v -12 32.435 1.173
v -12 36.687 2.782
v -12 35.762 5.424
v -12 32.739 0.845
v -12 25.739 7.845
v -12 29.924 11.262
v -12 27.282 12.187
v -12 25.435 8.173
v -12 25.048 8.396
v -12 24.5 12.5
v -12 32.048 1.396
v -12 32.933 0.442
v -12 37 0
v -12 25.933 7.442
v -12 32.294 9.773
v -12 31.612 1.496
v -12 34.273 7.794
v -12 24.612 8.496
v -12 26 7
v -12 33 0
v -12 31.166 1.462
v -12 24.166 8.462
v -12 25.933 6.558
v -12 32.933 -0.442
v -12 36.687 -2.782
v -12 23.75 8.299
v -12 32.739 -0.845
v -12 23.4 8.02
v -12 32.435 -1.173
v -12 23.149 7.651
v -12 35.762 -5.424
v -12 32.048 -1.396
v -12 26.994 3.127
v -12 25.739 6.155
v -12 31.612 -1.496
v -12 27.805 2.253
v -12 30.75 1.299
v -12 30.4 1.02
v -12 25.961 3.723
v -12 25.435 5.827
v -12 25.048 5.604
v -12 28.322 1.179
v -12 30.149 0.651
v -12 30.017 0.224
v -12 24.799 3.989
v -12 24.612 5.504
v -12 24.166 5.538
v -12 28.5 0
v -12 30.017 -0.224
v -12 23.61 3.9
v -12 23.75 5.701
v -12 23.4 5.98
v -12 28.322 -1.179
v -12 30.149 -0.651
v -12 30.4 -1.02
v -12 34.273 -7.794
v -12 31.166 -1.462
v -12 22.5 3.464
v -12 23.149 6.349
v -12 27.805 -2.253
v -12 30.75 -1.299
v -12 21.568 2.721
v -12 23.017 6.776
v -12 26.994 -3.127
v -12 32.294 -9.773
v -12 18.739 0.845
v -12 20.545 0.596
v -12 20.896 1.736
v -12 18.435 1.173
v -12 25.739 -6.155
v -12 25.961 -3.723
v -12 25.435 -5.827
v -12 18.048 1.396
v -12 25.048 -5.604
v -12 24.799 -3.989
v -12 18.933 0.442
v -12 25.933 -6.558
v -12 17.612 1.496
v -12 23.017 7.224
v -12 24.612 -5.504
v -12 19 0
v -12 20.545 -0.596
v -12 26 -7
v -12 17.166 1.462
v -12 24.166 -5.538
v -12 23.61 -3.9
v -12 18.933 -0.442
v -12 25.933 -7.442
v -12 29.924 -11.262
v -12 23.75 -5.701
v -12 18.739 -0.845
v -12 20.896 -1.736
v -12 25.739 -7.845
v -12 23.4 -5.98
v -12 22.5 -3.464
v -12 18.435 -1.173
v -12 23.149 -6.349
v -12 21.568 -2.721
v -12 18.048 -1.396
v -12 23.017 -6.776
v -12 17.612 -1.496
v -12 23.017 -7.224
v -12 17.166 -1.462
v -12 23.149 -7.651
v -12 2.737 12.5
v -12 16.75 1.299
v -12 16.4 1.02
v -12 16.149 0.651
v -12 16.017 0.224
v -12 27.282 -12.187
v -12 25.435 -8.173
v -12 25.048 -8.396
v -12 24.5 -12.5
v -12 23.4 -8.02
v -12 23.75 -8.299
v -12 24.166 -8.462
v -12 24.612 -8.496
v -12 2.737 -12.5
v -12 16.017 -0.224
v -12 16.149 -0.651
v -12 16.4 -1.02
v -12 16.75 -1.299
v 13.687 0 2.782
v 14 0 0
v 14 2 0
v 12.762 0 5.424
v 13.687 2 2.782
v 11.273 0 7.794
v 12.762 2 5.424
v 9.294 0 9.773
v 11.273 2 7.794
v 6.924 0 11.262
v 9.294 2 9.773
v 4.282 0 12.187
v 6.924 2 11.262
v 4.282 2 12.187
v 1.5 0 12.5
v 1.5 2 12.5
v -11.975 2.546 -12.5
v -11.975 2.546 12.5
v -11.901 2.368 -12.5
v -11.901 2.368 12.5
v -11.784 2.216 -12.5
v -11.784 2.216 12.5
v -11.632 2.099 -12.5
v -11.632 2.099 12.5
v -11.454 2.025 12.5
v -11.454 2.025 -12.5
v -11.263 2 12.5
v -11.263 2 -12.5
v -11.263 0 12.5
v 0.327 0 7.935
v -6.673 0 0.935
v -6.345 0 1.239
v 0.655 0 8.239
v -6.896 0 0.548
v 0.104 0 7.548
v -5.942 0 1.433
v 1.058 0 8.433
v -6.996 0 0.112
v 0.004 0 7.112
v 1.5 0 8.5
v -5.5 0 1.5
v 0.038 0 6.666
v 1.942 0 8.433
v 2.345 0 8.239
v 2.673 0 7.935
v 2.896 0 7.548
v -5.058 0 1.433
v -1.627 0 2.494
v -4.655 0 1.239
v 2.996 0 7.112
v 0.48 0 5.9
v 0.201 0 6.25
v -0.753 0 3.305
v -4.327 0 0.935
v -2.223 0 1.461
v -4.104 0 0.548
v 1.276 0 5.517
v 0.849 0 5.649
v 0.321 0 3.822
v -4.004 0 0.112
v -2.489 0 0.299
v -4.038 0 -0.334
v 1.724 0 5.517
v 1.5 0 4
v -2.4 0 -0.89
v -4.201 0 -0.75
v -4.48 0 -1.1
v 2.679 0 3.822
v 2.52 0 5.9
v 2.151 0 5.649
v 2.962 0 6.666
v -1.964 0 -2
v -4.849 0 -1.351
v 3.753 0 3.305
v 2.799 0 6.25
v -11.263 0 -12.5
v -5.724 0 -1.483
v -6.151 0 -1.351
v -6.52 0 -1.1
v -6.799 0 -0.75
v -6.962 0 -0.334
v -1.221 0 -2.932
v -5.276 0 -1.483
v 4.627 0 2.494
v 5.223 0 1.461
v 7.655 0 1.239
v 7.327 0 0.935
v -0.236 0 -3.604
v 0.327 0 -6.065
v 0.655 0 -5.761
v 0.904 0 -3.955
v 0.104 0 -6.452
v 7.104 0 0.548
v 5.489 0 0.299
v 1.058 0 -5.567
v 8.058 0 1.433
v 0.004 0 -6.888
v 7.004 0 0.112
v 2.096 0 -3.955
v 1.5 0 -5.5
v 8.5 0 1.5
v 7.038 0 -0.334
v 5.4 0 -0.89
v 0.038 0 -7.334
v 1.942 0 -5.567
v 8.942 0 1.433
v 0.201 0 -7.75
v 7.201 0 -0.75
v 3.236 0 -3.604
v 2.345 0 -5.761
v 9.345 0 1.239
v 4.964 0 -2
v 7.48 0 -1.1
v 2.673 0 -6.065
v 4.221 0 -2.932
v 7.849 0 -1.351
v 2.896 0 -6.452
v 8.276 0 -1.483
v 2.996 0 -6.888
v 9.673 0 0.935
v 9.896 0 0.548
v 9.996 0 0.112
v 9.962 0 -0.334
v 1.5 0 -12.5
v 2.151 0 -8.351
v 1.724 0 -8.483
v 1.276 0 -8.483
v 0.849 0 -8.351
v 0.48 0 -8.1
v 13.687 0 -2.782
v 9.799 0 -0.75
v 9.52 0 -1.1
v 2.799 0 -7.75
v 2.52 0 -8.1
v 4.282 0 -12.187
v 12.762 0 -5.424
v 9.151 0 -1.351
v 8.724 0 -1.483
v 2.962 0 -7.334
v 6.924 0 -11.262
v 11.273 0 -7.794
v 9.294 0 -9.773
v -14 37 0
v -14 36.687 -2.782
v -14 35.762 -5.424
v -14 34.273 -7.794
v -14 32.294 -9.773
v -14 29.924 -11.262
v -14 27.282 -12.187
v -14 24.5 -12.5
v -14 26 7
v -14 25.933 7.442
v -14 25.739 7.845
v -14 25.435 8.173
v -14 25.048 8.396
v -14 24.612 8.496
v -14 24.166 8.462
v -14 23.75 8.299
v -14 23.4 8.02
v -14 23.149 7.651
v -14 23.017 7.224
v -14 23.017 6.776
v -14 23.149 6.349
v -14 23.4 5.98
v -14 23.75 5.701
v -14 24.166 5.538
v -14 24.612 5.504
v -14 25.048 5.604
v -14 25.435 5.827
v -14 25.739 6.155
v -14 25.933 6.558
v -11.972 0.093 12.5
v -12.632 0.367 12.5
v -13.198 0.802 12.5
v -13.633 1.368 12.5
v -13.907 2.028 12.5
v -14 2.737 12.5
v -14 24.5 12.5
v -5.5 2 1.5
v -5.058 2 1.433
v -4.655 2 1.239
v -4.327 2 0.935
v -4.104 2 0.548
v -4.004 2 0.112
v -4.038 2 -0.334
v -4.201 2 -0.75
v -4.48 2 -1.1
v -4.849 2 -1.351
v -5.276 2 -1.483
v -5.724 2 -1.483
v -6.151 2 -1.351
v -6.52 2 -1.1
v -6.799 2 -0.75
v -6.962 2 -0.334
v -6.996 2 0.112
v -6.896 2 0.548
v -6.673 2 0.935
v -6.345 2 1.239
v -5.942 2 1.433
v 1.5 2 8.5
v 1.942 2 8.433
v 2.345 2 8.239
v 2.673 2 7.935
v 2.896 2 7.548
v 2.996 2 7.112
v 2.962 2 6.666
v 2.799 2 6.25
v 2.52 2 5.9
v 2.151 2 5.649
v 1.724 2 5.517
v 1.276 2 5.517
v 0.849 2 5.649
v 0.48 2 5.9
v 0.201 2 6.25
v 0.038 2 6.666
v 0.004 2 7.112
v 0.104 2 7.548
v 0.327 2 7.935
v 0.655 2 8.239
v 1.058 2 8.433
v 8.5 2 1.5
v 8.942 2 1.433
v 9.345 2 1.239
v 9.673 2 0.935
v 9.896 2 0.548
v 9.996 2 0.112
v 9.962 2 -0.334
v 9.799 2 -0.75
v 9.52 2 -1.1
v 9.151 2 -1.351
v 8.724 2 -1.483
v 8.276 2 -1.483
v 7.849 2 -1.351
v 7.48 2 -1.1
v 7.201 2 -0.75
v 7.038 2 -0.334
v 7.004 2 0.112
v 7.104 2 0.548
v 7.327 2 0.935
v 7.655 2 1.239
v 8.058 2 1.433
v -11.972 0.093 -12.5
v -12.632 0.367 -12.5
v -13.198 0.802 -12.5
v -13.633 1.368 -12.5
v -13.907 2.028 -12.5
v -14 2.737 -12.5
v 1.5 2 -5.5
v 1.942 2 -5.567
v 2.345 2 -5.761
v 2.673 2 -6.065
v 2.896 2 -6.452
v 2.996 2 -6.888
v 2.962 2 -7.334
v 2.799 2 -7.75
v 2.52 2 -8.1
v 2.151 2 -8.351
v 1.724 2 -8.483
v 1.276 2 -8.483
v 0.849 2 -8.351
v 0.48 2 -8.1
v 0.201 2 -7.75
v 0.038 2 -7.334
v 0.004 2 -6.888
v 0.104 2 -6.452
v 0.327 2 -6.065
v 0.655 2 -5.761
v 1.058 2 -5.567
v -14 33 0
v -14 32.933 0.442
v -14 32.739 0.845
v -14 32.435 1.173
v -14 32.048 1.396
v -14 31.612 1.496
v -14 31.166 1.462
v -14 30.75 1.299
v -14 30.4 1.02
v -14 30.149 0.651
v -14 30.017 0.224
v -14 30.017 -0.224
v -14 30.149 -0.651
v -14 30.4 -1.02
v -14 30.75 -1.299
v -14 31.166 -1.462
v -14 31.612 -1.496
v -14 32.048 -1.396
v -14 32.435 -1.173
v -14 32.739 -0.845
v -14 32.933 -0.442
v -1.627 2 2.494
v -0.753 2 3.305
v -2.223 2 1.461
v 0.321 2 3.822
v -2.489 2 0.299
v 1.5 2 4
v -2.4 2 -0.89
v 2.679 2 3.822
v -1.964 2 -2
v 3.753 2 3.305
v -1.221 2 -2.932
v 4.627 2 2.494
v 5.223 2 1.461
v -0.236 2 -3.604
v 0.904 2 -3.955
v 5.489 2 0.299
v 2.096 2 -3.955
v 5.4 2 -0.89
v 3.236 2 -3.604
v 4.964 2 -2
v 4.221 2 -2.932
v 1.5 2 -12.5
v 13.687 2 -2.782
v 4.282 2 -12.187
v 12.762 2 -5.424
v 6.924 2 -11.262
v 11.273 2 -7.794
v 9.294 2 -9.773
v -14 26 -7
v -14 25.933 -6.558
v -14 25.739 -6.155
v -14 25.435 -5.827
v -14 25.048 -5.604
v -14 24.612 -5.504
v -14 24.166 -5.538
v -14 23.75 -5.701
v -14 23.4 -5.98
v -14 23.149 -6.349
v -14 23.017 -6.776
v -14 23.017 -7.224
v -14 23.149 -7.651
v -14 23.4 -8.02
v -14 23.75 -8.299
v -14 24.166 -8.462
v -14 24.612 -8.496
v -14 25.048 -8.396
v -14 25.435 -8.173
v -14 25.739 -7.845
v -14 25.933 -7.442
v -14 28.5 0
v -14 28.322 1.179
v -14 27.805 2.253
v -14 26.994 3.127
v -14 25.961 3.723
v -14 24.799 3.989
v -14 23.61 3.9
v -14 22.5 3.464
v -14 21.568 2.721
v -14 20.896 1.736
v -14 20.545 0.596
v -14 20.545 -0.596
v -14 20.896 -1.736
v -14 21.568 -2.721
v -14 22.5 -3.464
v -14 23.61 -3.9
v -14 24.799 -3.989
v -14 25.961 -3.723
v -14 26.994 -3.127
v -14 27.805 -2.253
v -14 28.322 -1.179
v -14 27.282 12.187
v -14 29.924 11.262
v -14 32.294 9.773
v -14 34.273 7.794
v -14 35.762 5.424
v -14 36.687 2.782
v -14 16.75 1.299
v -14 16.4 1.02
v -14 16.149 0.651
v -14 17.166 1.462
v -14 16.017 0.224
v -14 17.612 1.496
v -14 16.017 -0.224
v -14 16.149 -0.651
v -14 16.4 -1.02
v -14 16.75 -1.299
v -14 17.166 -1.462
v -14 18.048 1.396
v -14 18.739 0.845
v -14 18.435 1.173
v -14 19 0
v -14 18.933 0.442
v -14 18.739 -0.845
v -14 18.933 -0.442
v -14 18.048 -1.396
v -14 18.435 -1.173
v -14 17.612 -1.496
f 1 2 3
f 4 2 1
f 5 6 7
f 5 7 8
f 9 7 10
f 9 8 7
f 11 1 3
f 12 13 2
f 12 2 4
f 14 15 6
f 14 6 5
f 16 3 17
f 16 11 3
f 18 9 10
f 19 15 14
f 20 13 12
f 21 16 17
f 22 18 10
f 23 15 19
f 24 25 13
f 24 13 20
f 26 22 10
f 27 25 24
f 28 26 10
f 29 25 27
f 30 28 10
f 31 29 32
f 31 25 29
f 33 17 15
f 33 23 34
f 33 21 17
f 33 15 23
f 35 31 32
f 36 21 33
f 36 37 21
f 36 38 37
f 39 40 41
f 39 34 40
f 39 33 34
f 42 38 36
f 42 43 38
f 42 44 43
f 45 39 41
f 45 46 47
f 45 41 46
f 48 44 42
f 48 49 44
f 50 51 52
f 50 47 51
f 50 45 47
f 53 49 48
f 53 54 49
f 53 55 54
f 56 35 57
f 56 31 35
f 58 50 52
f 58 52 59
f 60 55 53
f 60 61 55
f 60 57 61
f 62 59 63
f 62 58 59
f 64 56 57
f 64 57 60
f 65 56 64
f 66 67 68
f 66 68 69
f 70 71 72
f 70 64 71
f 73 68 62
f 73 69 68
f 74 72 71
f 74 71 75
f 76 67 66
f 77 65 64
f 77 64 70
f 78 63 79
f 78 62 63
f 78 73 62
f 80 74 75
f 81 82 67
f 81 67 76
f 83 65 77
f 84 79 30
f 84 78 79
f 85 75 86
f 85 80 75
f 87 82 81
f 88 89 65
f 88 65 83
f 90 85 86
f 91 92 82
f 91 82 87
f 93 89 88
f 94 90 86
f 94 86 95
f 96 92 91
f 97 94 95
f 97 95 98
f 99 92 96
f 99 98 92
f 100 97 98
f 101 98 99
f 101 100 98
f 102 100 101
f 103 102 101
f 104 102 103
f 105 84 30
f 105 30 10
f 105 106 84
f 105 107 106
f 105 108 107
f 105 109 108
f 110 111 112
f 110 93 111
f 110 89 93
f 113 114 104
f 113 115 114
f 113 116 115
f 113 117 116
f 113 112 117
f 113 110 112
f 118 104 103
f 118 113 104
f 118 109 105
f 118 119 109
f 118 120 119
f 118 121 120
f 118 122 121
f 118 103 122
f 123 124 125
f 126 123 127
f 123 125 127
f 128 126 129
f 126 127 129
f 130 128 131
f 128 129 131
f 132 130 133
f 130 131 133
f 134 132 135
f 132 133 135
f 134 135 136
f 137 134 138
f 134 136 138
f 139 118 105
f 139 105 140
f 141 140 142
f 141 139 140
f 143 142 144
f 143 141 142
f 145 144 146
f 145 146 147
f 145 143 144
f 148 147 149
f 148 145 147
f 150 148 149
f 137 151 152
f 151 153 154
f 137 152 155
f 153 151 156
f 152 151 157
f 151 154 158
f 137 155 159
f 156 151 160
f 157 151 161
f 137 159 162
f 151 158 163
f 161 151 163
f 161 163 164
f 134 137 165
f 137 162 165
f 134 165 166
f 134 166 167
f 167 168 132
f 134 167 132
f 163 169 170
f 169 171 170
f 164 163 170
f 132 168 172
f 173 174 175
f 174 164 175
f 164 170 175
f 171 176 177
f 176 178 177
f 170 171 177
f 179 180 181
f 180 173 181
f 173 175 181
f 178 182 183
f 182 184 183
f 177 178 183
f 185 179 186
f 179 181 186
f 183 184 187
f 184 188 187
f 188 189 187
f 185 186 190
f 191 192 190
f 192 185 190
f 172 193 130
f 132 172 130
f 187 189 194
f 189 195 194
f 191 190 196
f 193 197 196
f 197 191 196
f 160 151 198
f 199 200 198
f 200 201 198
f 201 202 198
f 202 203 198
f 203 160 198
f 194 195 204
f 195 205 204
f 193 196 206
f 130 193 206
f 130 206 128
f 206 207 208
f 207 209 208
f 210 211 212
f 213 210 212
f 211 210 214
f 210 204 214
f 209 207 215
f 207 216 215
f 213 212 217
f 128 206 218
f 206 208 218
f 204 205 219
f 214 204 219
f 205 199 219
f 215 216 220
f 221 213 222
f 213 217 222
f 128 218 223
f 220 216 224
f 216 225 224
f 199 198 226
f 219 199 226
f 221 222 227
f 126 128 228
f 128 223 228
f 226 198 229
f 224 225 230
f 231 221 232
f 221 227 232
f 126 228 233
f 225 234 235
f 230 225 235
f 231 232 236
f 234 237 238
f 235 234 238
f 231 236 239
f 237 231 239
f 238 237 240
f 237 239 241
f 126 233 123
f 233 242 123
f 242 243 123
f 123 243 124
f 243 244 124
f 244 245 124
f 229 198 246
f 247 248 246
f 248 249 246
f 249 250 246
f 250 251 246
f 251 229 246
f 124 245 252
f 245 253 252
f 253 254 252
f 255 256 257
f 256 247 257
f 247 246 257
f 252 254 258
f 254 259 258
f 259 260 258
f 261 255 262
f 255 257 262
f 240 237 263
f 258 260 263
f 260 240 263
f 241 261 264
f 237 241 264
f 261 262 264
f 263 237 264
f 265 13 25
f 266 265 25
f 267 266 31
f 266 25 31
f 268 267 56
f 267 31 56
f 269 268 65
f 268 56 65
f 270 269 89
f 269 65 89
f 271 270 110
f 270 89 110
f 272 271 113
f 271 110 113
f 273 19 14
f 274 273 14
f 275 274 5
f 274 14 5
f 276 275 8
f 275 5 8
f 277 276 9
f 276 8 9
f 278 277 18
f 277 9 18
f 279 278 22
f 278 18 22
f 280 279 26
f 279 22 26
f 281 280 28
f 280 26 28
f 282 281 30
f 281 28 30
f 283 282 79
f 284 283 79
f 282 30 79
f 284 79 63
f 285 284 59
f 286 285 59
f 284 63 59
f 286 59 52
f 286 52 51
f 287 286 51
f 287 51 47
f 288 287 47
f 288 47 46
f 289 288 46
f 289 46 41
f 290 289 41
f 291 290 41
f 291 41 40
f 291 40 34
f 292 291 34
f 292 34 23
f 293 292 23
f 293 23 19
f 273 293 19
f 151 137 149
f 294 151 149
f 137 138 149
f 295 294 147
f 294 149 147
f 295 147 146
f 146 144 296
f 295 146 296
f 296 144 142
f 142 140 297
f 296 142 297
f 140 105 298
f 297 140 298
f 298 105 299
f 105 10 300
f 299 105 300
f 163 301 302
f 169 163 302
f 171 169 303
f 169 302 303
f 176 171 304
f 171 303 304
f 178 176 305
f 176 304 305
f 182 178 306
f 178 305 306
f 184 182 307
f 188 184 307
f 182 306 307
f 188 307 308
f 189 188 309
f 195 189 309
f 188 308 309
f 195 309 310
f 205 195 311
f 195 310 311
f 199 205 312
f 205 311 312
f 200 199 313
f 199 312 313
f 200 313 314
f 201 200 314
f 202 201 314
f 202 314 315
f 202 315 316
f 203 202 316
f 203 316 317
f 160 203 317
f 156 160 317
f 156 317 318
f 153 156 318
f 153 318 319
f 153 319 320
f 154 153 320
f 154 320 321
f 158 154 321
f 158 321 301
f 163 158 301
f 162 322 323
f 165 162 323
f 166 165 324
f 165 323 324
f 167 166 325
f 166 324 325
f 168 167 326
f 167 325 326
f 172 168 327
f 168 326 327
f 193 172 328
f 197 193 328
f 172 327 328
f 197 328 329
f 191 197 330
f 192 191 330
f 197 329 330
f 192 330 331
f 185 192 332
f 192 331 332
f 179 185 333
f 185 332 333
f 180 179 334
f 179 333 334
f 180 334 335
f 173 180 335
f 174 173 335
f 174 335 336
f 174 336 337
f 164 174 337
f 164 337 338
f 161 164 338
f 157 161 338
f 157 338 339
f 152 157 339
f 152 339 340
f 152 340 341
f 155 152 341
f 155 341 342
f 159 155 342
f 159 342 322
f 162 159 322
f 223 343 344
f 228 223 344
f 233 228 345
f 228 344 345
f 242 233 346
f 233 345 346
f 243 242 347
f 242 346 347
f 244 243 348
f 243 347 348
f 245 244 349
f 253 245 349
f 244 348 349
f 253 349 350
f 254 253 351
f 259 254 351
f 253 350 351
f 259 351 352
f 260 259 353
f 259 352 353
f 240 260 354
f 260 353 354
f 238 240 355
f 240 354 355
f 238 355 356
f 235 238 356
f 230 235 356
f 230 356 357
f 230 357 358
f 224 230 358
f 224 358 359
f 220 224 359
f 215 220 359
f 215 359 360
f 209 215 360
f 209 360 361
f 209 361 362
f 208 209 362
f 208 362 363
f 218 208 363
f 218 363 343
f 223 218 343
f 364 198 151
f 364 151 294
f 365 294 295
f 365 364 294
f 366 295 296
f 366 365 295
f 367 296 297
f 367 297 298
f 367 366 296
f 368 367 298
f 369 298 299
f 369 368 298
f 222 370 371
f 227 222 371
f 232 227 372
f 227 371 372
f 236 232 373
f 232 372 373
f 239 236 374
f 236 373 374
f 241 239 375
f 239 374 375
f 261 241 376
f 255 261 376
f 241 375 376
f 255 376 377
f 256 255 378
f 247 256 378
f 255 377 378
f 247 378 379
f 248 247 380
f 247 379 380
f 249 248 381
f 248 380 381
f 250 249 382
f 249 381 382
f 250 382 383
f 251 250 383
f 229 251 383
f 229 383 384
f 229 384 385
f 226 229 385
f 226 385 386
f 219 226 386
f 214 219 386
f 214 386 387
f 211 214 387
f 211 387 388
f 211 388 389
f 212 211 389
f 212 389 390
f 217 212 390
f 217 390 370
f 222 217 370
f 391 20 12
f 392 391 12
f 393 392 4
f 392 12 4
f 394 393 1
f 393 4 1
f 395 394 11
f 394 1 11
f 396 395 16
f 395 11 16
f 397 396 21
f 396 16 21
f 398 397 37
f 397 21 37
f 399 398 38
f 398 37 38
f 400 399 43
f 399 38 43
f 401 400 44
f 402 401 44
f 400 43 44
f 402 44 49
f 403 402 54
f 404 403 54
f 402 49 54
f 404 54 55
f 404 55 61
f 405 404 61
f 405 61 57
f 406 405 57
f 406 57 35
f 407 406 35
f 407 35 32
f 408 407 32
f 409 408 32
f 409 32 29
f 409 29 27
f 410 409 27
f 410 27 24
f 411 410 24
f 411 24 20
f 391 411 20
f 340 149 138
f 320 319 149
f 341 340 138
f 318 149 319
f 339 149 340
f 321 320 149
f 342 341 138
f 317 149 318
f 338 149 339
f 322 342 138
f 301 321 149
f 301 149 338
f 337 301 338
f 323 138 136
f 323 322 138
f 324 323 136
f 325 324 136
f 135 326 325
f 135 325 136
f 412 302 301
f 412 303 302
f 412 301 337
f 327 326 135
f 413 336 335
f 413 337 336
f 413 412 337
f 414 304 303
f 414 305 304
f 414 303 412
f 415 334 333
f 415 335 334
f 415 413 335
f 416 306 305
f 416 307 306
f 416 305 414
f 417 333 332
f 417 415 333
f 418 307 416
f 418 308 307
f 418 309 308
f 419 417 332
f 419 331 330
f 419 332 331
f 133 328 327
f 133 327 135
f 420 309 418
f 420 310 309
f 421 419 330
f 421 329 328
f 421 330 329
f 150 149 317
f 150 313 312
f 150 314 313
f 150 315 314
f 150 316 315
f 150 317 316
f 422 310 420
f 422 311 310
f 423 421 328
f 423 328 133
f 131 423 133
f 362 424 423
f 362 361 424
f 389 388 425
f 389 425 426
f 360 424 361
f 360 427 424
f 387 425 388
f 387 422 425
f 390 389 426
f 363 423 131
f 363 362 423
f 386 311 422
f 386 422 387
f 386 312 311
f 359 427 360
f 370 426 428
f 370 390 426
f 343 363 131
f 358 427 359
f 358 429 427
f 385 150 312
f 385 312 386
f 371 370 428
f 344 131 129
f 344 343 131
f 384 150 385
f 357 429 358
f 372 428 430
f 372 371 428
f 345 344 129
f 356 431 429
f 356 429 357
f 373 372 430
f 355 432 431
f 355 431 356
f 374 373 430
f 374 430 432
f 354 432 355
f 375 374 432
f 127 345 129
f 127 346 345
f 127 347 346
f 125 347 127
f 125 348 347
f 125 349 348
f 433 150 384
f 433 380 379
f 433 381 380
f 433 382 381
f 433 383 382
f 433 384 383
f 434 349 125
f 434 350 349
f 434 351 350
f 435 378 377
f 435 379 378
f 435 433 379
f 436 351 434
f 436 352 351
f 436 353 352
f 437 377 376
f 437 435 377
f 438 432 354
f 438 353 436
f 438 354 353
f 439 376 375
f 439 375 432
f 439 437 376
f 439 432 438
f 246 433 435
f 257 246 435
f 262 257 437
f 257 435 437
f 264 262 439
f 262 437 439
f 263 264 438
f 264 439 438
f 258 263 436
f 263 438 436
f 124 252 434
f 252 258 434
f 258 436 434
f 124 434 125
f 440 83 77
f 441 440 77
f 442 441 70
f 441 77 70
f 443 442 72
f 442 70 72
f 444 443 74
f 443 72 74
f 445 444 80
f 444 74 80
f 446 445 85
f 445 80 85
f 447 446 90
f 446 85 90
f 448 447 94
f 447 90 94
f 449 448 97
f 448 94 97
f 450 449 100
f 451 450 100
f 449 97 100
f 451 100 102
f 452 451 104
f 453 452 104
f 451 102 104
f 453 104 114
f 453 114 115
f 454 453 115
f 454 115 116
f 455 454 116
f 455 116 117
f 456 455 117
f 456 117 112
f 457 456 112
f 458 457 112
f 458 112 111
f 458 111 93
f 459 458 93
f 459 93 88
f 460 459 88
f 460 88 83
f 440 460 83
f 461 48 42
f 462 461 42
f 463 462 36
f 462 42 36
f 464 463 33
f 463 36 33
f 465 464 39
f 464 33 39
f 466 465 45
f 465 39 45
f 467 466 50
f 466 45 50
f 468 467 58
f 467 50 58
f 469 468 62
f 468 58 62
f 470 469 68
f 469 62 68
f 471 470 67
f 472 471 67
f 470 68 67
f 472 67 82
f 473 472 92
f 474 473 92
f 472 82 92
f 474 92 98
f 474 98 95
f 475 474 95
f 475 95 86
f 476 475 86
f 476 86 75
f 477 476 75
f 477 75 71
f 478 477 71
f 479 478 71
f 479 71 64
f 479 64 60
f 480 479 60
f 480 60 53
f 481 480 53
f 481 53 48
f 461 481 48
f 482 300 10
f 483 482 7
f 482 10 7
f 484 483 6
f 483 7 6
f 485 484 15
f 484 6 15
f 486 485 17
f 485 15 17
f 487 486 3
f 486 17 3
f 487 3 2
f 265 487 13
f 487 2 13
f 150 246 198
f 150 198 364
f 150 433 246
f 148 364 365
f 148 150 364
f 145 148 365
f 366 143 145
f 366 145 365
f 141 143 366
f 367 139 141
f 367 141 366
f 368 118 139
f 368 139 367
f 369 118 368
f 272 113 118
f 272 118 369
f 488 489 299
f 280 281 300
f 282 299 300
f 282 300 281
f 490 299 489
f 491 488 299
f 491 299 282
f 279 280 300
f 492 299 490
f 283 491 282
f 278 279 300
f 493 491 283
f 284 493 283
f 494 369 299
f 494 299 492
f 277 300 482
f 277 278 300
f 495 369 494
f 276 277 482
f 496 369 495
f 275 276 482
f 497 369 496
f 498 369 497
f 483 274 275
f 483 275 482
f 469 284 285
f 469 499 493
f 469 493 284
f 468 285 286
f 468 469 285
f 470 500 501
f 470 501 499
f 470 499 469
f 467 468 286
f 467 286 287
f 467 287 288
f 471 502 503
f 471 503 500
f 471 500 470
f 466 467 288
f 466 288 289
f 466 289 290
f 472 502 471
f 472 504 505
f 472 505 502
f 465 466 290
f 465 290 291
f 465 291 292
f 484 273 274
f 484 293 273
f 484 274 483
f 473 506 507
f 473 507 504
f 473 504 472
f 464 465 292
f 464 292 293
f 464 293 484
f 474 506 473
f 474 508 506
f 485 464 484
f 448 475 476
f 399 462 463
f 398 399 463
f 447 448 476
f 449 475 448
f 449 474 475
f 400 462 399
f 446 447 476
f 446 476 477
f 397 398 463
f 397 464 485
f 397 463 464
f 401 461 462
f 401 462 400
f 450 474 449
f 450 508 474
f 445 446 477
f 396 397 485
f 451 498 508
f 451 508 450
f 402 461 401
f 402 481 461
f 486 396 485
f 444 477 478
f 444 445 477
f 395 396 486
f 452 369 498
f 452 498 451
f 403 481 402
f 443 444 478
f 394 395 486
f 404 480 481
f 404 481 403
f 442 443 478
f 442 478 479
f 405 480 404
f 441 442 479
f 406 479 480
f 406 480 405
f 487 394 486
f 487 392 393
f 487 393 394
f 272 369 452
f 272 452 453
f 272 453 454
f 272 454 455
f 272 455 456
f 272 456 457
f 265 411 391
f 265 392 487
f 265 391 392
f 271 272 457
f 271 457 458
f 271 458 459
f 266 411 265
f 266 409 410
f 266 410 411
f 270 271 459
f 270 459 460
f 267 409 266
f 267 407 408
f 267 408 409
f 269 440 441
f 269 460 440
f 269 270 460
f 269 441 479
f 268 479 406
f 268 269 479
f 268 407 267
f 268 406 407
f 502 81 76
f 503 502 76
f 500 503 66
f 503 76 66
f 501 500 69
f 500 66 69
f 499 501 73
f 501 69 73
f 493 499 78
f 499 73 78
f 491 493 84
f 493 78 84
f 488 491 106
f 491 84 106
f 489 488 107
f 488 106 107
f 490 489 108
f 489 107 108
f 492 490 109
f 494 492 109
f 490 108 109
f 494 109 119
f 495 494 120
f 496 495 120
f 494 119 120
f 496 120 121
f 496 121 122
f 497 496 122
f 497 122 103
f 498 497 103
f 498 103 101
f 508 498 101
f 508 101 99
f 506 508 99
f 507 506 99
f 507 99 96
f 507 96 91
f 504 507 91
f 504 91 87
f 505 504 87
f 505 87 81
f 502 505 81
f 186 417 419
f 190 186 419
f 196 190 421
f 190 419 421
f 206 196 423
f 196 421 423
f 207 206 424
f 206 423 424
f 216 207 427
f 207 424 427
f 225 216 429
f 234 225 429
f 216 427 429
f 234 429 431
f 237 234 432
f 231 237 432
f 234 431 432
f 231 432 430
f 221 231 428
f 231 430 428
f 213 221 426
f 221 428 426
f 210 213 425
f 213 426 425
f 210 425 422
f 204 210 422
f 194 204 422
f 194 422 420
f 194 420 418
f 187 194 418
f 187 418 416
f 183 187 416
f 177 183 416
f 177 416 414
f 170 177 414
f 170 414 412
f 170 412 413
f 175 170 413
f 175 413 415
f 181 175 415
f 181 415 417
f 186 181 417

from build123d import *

# Parameters (mm, degrees)
SCHIZZO1_W                     = 28
SCHIZZO1_H                     = 25
BASE_FLANGIA1_DEPTH            = 2
BORDO_FLANGIA1_STRIP_W         = 9.4732
BORDO_FLANGIA1_STRIP_H         = 2
BORDO_FLANGIA1_STRIP_CUT_DEPTH = 25
BORDO_FLANGIA1_DEPTH           = 25
SCHIZZO3_R                     = 4
SCHIZZO3_R_2                   = 1.5
TAGLIO_ESTRUSIONE1_DEPTH       = 40.714606885
SCHIZZO4_R                     = 1.5
SCHIZZO4_R_2                   = 4
TAGLIO_ESTRUSIONE2_DEPTH       = 47.917480751


# Sheet-metal steps are written as plain solids
with BuildPart() as part:
    # Schizzo1 → Base-Flangia1 (new body)
    with BuildSketch(Plane(origin=(0, 0, 0), x_dir=(1, 0, 0), z_dir=(0, 1, 0))):
        Rectangle(SCHIZZO1_W, SCHIZZO1_H)
    extrude(amount=BASE_FLANGIA1_DEPTH)

    # Bordo-Flangia1 strip (across the edge) → Bordo-Flangia1 strip cut (cut)
    with BuildSketch(Plane(origin=(-14, 2, -12.5), x_dir=(1, 0, 0), z_dir=(0, 0, 1))):
        with Locations((-2, -1)):
            Rectangle(BORDO_FLANGIA1_STRIP_W, BORDO_FLANGIA1_STRIP_H)
    extrude(amount=BORDO_FLANGIA1_STRIP_CUT_DEPTH, mode=Mode.SUBTRACT)

    # Bordo-Flangia1 section (across the edge) → Bordo-Flangia1 (add)
    with BuildSketch(Plane(origin=(-14, 2, -12.5), x_dir=(1, 0, 0), z_dir=(0, 0, 1))):
        with BuildLine():
            Line((0, 0.7366), (0, 35))
            Line((0, 35), (2, 35))
            Line((2, 35), (2, 0.7366))
            ThreePointArc((2, 0.7366), (2.215745145, 0.215745145), (2.7366, 0))
            Line((2.7366, 0), (2.7366, -2))
            ThreePointArc((2.7366, -2), (0.801531583, -1.198468417), (0, 0.7366))
        make_face()
    extrude(amount=BORDO_FLANGIA1_DEPTH)

    # Schizzo3 → Taglio-Estrusione1 (cut, through all)
    with BuildSketch(Plane(origin=(0, 2, 0), x_dir=(1, 0, 0), z_dir=(0, 1, 0))):
        with Locations(Location((1.5, 0, 0), (0, 0, 270))):
            Circle(SCHIZZO3_R)
        with Locations(Location((1.5, 7, 0), (0, 0, 270))):
            Circle(SCHIZZO3_R_2)
        with Locations(Location((-5.5, 0, 0), (0, 0, 270))):
            Circle(SCHIZZO3_R_2)
        with Locations(Location((1.5, -7, 0), (0, 0, 270))):
            Circle(SCHIZZO3_R_2)
        with Locations(Location((8.5, 0, 0), (0, 0, 270))):
            Circle(SCHIZZO3_R_2)
        with BuildLine():
            ThreePointArc((1.5, 12.5), (10.338834766, 8.838834764), (14, -3e-09))
            Line((14, -3e-09), (14, 12.5))
            Line((14, 12.5), (1.5, 12.5))
        make_face()
        with BuildLine():
            ThreePointArc((14, -3e-09), (10.338834764, -8.838834766), (1.5, -12.5))
            Line((1.5, -12.5), (14, -12.5))
            Line((14, -12.5), (14, -3e-09))
        make_face()
    extrude(amount=-TAGLIO_ESTRUSIONE1_DEPTH, mode=Mode.SUBTRACT)

    # Schizzo4 → Taglio-Estrusione2 (cut, through all)
    with BuildSketch(Plane(origin=(-12, 0, 0), x_dir=(0, 0, -1), z_dir=(1, 0, 0))):
        with BuildLine():
            Line((12.5, 24.5), (12.5, 37))
            Line((12.5, 37), (3.9e-08, 37))
            ThreePointArc((3.9e-08, 37), (8.838834779, 33.338834751), (12.5, 24.5))
        make_face()
        with BuildLine():
            ThreePointArc((-12.5, 24.5), (-8.838834751, 33.338834779), (3.9e-08, 37))
            Line((3.9e-08, 37), (-12.5, 37))
            Line((-12.5, 37), (-12.5, 24.5))
        make_face()
        with Locations(Location((0, 31.5, 0), (0, 0, 90))):
            Circle(SCHIZZO4_R)
        with Locations(Location((0, 24.5, 0), (0, 0, 90))):
            Circle(SCHIZZO4_R_2)
        with Locations(Location((7, 24.5, 0), (0, 0, 90))):
            Circle(SCHIZZO4_R)
        with Locations(Location((0, 17.5, 0), (0, 0, 90))):
            Circle(SCHIZZO4_R)
        with Locations(Location((-7, 24.5, 0), (0, 0, 90))):
            Circle(SCHIZZO4_R)
    extrude(amount=-TAGLIO_ESTRUSIONE2_DEPTH, mode=Mode.SUBTRACT)


solid = part.part
